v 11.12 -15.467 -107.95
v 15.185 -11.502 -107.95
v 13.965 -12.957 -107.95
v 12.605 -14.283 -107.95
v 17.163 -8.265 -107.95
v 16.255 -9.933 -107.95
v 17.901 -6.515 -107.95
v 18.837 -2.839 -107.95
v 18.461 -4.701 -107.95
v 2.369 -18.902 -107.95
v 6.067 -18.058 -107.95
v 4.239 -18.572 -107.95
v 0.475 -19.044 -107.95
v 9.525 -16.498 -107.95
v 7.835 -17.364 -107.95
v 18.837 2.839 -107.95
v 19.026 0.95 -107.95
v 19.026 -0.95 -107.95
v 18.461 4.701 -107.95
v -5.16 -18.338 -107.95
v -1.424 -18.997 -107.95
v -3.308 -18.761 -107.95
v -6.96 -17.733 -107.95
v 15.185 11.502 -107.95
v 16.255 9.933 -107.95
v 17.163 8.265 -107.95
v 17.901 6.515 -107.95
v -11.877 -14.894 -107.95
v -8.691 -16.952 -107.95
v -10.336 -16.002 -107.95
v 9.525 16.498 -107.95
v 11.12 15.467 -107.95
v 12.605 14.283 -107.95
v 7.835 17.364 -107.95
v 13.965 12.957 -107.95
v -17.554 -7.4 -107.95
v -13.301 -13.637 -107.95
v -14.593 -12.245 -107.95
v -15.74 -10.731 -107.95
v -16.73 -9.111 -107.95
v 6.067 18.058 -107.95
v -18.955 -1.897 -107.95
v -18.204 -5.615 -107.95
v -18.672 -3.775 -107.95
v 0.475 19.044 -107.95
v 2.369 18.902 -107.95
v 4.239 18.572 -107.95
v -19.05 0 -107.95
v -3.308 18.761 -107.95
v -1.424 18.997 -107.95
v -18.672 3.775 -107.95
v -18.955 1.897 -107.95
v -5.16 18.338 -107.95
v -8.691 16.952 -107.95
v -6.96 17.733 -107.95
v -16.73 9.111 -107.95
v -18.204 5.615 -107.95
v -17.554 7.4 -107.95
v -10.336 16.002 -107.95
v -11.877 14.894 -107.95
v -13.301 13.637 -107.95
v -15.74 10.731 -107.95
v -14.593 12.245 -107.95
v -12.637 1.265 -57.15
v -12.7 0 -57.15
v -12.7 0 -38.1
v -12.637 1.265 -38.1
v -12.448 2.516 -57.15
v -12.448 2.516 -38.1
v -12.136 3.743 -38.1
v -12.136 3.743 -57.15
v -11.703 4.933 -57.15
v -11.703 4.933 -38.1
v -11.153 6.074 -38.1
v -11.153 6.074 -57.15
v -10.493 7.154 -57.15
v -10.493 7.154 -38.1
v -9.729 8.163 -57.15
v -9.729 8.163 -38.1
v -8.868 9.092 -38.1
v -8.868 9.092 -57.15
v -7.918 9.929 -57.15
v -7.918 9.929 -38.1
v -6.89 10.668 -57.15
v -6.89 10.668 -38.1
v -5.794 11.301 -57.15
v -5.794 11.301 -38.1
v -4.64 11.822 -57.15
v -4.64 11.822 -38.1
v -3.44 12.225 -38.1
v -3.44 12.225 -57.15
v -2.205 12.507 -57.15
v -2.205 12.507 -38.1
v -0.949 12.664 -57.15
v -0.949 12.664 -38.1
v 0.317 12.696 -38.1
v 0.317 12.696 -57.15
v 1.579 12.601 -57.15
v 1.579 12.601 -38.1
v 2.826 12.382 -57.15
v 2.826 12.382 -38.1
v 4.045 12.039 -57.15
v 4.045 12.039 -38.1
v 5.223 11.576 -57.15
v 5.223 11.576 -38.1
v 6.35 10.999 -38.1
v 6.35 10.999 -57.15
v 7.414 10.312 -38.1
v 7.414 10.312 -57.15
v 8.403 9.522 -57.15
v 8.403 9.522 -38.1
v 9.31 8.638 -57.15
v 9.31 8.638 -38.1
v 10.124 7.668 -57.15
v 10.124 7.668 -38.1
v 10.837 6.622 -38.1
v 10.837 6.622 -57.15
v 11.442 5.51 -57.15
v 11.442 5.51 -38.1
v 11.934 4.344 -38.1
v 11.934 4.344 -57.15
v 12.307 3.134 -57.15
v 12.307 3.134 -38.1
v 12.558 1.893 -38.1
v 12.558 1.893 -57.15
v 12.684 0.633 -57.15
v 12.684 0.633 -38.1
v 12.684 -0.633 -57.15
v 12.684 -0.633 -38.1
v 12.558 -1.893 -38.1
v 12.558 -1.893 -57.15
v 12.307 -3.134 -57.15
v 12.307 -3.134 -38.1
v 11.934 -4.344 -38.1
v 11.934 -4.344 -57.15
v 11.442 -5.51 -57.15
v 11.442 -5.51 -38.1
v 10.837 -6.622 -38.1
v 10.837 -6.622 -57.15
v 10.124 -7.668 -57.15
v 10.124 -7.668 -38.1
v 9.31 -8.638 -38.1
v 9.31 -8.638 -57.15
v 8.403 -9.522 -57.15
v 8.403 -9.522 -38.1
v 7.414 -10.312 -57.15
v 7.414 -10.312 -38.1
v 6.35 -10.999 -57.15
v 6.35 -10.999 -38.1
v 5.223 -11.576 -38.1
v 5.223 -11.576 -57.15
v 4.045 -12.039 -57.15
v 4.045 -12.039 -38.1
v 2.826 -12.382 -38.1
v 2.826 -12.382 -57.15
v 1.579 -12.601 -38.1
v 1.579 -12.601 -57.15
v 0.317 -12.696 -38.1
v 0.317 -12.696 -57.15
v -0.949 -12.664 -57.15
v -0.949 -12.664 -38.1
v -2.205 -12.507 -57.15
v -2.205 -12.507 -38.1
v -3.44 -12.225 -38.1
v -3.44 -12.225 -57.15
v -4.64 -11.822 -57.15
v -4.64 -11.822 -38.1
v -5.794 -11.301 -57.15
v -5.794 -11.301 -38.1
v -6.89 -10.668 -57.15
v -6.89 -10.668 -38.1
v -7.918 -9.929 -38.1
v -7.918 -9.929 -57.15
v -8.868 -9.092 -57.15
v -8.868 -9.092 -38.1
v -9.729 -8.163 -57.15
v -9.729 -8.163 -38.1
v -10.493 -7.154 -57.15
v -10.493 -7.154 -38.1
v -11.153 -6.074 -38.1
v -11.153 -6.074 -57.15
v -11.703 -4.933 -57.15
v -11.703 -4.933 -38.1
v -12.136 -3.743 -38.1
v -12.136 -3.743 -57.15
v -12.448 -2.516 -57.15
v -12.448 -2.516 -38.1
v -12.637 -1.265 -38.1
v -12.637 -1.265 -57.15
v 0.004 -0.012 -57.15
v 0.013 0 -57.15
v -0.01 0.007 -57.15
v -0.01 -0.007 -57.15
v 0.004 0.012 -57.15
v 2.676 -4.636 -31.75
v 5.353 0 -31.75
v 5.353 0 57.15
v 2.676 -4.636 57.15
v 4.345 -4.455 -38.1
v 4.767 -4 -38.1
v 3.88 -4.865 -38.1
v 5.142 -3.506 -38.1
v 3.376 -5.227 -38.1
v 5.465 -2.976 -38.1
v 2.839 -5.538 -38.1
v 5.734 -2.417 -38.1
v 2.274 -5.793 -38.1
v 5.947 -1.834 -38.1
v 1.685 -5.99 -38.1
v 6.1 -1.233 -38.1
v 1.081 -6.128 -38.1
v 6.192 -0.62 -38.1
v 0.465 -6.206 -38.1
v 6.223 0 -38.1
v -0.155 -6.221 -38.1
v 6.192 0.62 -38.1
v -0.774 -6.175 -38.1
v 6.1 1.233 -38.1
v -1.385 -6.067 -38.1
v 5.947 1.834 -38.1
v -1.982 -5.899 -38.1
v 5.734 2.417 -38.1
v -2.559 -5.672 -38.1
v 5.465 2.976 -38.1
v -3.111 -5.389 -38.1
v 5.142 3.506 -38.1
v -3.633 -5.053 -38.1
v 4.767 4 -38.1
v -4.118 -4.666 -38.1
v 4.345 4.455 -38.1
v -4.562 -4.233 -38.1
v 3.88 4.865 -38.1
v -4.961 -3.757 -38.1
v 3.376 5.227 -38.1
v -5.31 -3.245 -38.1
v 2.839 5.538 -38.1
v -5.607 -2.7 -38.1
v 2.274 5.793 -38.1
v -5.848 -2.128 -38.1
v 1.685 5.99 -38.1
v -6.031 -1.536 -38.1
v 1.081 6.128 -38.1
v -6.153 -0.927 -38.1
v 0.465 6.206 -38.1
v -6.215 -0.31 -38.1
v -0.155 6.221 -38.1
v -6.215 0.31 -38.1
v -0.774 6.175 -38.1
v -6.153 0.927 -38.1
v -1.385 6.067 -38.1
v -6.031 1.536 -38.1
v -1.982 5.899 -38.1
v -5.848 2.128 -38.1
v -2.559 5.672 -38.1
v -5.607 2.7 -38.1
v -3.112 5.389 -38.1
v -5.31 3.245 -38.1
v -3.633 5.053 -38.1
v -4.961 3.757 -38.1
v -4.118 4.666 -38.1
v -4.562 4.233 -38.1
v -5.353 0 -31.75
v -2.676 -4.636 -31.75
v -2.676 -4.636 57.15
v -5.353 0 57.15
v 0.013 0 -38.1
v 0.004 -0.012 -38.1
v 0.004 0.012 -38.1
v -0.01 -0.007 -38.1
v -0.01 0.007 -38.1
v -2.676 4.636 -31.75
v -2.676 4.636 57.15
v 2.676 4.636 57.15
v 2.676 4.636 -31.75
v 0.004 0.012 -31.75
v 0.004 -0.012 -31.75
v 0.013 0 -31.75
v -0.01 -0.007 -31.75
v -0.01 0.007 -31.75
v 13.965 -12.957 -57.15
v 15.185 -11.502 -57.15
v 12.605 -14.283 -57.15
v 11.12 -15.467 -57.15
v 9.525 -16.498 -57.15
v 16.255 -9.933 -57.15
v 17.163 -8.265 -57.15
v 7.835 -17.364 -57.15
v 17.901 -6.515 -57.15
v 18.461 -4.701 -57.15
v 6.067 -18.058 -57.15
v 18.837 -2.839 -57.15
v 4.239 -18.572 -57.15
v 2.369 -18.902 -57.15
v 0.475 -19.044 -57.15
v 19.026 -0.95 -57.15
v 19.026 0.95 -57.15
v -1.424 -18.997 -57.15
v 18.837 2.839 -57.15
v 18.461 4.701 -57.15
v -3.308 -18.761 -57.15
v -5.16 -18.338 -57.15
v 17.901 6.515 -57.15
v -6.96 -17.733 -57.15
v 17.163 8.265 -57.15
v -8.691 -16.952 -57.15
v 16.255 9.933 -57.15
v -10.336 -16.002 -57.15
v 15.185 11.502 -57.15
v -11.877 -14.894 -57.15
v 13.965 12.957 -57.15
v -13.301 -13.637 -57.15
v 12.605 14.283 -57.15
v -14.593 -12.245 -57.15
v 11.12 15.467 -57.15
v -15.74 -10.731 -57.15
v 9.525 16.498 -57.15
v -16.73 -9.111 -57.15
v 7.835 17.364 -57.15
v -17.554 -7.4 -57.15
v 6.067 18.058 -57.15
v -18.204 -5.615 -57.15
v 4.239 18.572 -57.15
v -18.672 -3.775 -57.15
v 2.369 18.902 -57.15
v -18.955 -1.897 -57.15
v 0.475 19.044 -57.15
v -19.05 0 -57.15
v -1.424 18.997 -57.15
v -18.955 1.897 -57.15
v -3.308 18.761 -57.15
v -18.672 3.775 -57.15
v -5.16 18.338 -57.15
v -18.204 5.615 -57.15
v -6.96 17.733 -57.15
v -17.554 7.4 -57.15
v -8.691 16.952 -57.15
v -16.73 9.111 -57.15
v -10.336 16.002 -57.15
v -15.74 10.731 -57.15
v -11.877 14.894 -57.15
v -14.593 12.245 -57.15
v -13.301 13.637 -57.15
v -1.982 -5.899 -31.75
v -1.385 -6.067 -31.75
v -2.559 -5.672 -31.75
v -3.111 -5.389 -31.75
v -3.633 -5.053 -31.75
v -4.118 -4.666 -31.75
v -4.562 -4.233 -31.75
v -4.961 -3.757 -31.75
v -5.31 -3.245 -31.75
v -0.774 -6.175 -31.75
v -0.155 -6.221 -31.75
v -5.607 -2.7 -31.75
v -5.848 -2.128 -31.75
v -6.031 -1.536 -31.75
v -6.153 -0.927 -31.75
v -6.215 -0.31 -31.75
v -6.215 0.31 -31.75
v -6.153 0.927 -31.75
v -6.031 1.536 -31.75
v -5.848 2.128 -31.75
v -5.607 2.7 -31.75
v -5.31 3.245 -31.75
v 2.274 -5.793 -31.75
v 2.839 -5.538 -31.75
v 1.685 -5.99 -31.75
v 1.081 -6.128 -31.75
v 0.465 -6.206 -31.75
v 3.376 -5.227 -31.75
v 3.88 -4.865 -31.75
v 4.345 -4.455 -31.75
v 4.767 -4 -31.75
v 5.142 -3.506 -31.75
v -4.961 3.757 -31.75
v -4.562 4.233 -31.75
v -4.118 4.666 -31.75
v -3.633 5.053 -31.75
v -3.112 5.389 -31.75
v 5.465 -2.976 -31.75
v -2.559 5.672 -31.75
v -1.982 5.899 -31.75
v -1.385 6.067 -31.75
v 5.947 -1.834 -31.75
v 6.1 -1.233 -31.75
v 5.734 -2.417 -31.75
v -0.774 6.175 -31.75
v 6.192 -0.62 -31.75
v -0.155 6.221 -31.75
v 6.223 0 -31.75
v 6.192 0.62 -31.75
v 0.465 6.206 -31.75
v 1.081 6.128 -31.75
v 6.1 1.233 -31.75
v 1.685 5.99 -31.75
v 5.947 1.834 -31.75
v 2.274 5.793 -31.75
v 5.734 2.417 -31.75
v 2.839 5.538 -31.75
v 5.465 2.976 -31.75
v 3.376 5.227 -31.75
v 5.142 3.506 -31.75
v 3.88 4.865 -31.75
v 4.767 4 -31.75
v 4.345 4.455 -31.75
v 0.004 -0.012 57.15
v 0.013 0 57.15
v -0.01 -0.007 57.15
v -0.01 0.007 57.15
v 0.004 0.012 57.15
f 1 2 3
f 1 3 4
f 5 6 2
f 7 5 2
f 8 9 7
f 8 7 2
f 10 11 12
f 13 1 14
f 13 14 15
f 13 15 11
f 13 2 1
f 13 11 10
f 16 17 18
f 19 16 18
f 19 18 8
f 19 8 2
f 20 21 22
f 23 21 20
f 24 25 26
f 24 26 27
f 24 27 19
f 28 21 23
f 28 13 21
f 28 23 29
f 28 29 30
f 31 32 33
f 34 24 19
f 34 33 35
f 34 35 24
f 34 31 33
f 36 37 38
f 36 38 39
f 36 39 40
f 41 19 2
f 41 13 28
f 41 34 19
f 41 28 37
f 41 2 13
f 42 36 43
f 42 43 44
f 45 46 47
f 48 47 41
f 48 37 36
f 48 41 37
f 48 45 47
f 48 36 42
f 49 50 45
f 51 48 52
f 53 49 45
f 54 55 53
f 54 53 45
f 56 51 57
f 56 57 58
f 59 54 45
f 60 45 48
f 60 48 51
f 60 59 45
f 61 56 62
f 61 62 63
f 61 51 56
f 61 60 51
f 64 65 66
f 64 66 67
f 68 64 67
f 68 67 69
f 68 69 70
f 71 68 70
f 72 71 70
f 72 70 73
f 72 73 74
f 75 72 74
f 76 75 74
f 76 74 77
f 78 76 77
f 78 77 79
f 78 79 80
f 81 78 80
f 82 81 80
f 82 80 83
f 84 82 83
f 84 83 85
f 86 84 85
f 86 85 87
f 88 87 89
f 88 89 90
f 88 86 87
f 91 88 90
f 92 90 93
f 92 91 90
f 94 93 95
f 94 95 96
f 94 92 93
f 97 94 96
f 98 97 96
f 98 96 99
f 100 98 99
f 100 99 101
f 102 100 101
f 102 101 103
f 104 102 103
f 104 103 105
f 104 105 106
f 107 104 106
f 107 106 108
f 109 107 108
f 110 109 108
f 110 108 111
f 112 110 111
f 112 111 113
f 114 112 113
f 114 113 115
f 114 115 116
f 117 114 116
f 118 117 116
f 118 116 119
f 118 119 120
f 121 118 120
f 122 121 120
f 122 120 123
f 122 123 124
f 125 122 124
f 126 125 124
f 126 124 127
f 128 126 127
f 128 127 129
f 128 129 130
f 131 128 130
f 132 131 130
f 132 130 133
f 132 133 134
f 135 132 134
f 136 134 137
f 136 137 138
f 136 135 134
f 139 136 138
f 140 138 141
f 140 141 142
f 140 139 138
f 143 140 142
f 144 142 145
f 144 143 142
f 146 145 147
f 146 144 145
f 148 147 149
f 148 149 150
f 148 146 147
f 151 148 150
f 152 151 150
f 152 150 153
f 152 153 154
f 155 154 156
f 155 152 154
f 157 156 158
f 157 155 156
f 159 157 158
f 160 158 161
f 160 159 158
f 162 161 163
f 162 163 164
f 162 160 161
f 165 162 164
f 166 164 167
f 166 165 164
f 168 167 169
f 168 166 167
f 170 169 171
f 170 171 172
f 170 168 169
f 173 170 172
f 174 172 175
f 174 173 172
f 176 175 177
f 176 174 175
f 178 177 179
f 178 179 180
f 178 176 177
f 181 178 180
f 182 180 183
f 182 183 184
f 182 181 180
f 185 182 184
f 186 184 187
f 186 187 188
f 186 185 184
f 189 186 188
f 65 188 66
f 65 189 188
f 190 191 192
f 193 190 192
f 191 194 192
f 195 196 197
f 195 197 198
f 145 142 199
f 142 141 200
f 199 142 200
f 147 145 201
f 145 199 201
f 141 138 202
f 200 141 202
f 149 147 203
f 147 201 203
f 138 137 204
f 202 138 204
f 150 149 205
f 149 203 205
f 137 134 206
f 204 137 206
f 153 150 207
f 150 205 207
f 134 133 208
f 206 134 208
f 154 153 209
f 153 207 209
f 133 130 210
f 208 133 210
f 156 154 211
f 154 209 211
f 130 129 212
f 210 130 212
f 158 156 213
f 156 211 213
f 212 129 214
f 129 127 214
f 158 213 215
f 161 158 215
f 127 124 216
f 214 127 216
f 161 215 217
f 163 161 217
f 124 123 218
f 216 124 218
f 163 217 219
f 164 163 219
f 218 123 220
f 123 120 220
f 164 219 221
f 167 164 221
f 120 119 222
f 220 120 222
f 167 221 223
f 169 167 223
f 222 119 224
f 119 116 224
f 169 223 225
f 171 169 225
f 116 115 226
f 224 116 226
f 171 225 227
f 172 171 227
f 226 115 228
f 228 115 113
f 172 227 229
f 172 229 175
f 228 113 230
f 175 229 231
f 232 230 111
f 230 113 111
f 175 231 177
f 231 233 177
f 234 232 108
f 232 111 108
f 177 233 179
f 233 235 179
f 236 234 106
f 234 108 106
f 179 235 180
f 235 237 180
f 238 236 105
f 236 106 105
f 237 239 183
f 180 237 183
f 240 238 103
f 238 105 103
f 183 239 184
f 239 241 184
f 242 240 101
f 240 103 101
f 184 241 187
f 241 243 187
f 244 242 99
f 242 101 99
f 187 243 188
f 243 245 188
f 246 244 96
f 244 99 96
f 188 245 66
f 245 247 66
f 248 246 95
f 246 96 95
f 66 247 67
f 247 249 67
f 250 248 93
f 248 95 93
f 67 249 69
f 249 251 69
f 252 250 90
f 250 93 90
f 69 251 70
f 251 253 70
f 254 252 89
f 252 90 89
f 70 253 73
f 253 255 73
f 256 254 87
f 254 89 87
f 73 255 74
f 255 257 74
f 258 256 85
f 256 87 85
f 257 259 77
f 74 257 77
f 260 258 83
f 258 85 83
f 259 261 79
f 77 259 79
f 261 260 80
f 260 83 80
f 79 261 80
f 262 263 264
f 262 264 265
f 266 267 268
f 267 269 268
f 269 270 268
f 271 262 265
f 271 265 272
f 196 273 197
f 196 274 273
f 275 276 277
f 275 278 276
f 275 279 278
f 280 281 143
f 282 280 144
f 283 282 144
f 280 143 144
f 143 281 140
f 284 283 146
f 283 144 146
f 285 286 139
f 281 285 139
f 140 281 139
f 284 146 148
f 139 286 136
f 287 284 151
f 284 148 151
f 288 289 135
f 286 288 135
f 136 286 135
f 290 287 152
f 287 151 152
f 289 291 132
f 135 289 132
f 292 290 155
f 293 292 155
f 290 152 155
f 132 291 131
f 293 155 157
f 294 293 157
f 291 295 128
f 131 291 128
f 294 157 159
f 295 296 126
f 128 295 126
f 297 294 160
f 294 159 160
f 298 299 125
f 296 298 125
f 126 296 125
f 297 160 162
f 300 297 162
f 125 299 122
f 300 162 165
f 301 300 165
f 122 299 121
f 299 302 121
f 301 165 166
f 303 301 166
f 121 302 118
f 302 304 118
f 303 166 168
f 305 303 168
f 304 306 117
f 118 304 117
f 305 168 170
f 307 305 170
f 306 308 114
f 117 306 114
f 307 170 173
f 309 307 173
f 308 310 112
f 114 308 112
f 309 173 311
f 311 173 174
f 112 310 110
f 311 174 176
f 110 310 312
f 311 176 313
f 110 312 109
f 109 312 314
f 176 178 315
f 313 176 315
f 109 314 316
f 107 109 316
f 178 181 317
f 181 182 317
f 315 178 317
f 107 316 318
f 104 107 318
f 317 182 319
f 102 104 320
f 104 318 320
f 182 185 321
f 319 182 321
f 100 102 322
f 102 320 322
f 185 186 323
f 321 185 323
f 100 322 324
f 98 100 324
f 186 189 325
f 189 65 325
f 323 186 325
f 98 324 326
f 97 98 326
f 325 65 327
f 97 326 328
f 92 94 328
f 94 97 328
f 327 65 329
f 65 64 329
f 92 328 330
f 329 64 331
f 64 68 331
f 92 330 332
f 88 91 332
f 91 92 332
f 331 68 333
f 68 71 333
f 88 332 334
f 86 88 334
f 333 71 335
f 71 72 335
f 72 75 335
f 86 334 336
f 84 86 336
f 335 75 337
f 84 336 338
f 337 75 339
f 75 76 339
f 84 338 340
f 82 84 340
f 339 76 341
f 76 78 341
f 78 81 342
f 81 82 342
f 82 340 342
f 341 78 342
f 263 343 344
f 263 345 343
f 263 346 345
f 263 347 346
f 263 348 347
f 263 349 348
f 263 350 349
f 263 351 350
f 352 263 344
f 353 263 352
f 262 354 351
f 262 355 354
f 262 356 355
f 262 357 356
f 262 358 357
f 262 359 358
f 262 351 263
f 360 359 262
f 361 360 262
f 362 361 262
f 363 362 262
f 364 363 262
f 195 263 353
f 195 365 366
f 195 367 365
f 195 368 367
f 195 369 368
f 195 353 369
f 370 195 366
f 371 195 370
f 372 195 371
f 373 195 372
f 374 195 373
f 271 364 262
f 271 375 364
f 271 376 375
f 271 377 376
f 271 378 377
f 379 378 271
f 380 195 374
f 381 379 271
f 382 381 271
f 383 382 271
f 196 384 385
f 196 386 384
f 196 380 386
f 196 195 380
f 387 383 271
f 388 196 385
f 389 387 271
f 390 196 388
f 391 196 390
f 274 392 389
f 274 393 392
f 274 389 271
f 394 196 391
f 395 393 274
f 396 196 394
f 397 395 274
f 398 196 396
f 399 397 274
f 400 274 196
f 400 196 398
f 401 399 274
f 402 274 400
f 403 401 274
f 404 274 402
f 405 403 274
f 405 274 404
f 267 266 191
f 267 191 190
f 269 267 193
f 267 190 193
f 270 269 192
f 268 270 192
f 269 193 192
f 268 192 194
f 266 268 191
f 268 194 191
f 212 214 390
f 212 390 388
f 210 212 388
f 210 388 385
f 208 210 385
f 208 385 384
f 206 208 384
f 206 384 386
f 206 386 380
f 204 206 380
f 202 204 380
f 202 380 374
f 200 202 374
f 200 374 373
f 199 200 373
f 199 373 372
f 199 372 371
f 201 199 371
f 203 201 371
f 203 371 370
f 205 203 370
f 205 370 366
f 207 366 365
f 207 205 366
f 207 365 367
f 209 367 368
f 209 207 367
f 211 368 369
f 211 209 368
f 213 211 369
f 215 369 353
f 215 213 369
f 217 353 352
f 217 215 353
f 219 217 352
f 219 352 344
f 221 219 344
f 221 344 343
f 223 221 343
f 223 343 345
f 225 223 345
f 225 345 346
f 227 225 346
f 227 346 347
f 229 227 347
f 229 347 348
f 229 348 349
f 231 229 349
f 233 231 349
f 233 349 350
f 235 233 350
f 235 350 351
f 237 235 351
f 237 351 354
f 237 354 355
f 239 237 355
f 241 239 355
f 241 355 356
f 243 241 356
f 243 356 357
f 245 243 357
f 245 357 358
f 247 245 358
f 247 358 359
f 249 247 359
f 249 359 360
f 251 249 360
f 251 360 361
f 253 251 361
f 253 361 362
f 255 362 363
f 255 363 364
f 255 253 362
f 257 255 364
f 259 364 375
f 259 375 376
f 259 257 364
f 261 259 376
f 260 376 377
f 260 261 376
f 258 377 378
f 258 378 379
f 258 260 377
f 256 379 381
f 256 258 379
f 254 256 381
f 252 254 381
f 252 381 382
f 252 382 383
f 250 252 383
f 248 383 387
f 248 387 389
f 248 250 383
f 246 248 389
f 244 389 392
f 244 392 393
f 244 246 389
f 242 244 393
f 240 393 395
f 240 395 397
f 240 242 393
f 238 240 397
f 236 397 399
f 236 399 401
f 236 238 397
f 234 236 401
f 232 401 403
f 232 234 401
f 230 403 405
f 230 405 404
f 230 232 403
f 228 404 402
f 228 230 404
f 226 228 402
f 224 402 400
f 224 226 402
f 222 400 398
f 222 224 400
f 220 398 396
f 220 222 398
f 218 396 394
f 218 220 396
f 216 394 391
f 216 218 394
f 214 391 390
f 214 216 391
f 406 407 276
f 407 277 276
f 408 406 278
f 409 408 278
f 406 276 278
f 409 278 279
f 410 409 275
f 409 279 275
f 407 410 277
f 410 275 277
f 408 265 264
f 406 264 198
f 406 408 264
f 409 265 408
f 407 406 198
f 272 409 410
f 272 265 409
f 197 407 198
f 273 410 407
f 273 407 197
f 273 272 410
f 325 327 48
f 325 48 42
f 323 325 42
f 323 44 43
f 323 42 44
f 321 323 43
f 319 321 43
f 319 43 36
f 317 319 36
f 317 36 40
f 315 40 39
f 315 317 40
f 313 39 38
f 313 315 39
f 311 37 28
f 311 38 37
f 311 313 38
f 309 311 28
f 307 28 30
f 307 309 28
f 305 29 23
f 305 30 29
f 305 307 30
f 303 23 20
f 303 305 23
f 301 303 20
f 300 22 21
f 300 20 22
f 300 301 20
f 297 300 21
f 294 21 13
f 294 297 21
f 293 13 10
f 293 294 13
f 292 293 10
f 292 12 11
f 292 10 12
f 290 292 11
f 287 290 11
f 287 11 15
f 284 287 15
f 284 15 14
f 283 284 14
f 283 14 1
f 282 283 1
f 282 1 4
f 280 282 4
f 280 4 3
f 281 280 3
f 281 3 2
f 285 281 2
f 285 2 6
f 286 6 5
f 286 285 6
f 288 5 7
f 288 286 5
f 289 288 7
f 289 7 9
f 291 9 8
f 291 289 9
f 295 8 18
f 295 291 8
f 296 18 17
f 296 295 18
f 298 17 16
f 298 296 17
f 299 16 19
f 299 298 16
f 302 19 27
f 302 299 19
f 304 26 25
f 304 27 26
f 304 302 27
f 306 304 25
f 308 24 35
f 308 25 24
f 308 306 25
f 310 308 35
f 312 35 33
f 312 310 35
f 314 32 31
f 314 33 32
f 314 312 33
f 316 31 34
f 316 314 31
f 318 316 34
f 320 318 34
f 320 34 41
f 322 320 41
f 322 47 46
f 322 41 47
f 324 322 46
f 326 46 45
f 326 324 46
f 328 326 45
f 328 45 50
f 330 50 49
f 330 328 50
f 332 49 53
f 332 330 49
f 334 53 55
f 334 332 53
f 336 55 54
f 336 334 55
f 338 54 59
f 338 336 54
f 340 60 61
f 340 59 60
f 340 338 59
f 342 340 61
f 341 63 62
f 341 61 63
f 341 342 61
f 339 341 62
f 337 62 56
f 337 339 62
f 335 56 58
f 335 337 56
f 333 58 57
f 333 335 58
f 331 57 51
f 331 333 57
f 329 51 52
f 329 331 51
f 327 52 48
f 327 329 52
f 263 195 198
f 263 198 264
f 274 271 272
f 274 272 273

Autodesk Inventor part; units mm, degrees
ref_plane "YZ Plane" through (0, 0, 0) normal (1, 0, 0) x (0, 1, 0)
ref_plane "XZ Plane" through (0, 0, 0) normal (0, 1, 0) x (-1, 0, 0)
ref_plane "XY Plane" through (0, 0, 0) normal (0, 0, 1) x (1, 0, 0)
sketch "Sketch1" plane through (0, 0, 0) normal (0, 0, 1) x (1, 0, 0)
  line L0 (5.4993, 0) -> (2.7496, -4.7625)
  line L1 (2.7496, -4.7625) -> (-2.7496, -4.7625)
  line L2 (-2.7496, -4.7625) -> (-5.4993, 0)
  line L3 (-5.4993, 0) -> (-2.7496, 4.7625)
  line L4 (-2.7496, 4.7625) -> (2.7496, 4.7625)
  line L5 (2.7496, 4.7625) -> (5.4993, 0)
  circle A0 centre (0, 0) radius 0.0127
  dimension "d0" = 9.525
  dimension "d6" = 0.0254
extrude "Extrusion2" add sketch "Sketch1" along normal mid plane 114.3
sketch "Sketch4" plane through (0, 0, -57.15) normal (0, 0, -1) x (-1, 0, 0)
  circle A0 centre (0, 0) radius 0.0127 projected
  circle A1 centre (0, 0) radius 12.7
  dimension "d10" = 25.4
extrude "Extrusion4" add sketch "Sketch4" against normal blind 19.05
thicken "Reduce Hex Shaft" operation add thickness 0.127 both sides no extend neighbours yes toward (0, -1, 0) faces at (0.9165, 4.7625, -6.35) (4.5827, 1.5875, -6.35) (3.6662, -3.175, -6.35) (-3.6662, 3.175, -6.35) (-4.5827, -1.5875, -6.35) (-0.9165, -4.7625, -6.35)
sketch "Sketch5" plane through (0, 0, -38.1) normal (0, 0, 1) x (1, 0, 0)
  circle A0 centre (0, 0) radius 6.35
  dimension "d15" = 12.7
extrude "Extrusion5" add sketch "Sketch5" along normal blind 6.35
thicken "Reduce Base Bushing" operation add thickness 0.127 both sides no extend neighbours yes toward (-0.9967573, 0.0804666, 0) faces at (6.3294, -0.511, -33.8667)
sketch "Sketch8" plane through (0, 0, -57.15) normal (0, 0, -1) x (-1, 0, 0)
  circle A0 centre (0, 0) radius 19.05
  dimension "d28" = 38.1
extrude "Extrusion7" add sketch "Sketch8" along normal blind 50.8
equation "\"d0\" = hexSize"
equation "\"d4\" = length"
equation "\"d13\" = printOffset"
equation "\"d14\" = printOffset"
equation "\"d15\" = bushingForBaseHole"
equation "\"d16\" = sideOfBase"
equation "\"d20\" = printOffset"
equation "\"d21\" = printOffset"
equation "\"hexSize\" = 9.525"
equation "\"length\" = 114.3"
equation "\"printOffset\" = 0.127"
equation "\"bushingForBaseHole\" = 12.7"
equation "\"sideOfBase\" = 6.35"
properties part number "3_8x6_5-inchHexShaft" material "PC/ABS Plastic"
